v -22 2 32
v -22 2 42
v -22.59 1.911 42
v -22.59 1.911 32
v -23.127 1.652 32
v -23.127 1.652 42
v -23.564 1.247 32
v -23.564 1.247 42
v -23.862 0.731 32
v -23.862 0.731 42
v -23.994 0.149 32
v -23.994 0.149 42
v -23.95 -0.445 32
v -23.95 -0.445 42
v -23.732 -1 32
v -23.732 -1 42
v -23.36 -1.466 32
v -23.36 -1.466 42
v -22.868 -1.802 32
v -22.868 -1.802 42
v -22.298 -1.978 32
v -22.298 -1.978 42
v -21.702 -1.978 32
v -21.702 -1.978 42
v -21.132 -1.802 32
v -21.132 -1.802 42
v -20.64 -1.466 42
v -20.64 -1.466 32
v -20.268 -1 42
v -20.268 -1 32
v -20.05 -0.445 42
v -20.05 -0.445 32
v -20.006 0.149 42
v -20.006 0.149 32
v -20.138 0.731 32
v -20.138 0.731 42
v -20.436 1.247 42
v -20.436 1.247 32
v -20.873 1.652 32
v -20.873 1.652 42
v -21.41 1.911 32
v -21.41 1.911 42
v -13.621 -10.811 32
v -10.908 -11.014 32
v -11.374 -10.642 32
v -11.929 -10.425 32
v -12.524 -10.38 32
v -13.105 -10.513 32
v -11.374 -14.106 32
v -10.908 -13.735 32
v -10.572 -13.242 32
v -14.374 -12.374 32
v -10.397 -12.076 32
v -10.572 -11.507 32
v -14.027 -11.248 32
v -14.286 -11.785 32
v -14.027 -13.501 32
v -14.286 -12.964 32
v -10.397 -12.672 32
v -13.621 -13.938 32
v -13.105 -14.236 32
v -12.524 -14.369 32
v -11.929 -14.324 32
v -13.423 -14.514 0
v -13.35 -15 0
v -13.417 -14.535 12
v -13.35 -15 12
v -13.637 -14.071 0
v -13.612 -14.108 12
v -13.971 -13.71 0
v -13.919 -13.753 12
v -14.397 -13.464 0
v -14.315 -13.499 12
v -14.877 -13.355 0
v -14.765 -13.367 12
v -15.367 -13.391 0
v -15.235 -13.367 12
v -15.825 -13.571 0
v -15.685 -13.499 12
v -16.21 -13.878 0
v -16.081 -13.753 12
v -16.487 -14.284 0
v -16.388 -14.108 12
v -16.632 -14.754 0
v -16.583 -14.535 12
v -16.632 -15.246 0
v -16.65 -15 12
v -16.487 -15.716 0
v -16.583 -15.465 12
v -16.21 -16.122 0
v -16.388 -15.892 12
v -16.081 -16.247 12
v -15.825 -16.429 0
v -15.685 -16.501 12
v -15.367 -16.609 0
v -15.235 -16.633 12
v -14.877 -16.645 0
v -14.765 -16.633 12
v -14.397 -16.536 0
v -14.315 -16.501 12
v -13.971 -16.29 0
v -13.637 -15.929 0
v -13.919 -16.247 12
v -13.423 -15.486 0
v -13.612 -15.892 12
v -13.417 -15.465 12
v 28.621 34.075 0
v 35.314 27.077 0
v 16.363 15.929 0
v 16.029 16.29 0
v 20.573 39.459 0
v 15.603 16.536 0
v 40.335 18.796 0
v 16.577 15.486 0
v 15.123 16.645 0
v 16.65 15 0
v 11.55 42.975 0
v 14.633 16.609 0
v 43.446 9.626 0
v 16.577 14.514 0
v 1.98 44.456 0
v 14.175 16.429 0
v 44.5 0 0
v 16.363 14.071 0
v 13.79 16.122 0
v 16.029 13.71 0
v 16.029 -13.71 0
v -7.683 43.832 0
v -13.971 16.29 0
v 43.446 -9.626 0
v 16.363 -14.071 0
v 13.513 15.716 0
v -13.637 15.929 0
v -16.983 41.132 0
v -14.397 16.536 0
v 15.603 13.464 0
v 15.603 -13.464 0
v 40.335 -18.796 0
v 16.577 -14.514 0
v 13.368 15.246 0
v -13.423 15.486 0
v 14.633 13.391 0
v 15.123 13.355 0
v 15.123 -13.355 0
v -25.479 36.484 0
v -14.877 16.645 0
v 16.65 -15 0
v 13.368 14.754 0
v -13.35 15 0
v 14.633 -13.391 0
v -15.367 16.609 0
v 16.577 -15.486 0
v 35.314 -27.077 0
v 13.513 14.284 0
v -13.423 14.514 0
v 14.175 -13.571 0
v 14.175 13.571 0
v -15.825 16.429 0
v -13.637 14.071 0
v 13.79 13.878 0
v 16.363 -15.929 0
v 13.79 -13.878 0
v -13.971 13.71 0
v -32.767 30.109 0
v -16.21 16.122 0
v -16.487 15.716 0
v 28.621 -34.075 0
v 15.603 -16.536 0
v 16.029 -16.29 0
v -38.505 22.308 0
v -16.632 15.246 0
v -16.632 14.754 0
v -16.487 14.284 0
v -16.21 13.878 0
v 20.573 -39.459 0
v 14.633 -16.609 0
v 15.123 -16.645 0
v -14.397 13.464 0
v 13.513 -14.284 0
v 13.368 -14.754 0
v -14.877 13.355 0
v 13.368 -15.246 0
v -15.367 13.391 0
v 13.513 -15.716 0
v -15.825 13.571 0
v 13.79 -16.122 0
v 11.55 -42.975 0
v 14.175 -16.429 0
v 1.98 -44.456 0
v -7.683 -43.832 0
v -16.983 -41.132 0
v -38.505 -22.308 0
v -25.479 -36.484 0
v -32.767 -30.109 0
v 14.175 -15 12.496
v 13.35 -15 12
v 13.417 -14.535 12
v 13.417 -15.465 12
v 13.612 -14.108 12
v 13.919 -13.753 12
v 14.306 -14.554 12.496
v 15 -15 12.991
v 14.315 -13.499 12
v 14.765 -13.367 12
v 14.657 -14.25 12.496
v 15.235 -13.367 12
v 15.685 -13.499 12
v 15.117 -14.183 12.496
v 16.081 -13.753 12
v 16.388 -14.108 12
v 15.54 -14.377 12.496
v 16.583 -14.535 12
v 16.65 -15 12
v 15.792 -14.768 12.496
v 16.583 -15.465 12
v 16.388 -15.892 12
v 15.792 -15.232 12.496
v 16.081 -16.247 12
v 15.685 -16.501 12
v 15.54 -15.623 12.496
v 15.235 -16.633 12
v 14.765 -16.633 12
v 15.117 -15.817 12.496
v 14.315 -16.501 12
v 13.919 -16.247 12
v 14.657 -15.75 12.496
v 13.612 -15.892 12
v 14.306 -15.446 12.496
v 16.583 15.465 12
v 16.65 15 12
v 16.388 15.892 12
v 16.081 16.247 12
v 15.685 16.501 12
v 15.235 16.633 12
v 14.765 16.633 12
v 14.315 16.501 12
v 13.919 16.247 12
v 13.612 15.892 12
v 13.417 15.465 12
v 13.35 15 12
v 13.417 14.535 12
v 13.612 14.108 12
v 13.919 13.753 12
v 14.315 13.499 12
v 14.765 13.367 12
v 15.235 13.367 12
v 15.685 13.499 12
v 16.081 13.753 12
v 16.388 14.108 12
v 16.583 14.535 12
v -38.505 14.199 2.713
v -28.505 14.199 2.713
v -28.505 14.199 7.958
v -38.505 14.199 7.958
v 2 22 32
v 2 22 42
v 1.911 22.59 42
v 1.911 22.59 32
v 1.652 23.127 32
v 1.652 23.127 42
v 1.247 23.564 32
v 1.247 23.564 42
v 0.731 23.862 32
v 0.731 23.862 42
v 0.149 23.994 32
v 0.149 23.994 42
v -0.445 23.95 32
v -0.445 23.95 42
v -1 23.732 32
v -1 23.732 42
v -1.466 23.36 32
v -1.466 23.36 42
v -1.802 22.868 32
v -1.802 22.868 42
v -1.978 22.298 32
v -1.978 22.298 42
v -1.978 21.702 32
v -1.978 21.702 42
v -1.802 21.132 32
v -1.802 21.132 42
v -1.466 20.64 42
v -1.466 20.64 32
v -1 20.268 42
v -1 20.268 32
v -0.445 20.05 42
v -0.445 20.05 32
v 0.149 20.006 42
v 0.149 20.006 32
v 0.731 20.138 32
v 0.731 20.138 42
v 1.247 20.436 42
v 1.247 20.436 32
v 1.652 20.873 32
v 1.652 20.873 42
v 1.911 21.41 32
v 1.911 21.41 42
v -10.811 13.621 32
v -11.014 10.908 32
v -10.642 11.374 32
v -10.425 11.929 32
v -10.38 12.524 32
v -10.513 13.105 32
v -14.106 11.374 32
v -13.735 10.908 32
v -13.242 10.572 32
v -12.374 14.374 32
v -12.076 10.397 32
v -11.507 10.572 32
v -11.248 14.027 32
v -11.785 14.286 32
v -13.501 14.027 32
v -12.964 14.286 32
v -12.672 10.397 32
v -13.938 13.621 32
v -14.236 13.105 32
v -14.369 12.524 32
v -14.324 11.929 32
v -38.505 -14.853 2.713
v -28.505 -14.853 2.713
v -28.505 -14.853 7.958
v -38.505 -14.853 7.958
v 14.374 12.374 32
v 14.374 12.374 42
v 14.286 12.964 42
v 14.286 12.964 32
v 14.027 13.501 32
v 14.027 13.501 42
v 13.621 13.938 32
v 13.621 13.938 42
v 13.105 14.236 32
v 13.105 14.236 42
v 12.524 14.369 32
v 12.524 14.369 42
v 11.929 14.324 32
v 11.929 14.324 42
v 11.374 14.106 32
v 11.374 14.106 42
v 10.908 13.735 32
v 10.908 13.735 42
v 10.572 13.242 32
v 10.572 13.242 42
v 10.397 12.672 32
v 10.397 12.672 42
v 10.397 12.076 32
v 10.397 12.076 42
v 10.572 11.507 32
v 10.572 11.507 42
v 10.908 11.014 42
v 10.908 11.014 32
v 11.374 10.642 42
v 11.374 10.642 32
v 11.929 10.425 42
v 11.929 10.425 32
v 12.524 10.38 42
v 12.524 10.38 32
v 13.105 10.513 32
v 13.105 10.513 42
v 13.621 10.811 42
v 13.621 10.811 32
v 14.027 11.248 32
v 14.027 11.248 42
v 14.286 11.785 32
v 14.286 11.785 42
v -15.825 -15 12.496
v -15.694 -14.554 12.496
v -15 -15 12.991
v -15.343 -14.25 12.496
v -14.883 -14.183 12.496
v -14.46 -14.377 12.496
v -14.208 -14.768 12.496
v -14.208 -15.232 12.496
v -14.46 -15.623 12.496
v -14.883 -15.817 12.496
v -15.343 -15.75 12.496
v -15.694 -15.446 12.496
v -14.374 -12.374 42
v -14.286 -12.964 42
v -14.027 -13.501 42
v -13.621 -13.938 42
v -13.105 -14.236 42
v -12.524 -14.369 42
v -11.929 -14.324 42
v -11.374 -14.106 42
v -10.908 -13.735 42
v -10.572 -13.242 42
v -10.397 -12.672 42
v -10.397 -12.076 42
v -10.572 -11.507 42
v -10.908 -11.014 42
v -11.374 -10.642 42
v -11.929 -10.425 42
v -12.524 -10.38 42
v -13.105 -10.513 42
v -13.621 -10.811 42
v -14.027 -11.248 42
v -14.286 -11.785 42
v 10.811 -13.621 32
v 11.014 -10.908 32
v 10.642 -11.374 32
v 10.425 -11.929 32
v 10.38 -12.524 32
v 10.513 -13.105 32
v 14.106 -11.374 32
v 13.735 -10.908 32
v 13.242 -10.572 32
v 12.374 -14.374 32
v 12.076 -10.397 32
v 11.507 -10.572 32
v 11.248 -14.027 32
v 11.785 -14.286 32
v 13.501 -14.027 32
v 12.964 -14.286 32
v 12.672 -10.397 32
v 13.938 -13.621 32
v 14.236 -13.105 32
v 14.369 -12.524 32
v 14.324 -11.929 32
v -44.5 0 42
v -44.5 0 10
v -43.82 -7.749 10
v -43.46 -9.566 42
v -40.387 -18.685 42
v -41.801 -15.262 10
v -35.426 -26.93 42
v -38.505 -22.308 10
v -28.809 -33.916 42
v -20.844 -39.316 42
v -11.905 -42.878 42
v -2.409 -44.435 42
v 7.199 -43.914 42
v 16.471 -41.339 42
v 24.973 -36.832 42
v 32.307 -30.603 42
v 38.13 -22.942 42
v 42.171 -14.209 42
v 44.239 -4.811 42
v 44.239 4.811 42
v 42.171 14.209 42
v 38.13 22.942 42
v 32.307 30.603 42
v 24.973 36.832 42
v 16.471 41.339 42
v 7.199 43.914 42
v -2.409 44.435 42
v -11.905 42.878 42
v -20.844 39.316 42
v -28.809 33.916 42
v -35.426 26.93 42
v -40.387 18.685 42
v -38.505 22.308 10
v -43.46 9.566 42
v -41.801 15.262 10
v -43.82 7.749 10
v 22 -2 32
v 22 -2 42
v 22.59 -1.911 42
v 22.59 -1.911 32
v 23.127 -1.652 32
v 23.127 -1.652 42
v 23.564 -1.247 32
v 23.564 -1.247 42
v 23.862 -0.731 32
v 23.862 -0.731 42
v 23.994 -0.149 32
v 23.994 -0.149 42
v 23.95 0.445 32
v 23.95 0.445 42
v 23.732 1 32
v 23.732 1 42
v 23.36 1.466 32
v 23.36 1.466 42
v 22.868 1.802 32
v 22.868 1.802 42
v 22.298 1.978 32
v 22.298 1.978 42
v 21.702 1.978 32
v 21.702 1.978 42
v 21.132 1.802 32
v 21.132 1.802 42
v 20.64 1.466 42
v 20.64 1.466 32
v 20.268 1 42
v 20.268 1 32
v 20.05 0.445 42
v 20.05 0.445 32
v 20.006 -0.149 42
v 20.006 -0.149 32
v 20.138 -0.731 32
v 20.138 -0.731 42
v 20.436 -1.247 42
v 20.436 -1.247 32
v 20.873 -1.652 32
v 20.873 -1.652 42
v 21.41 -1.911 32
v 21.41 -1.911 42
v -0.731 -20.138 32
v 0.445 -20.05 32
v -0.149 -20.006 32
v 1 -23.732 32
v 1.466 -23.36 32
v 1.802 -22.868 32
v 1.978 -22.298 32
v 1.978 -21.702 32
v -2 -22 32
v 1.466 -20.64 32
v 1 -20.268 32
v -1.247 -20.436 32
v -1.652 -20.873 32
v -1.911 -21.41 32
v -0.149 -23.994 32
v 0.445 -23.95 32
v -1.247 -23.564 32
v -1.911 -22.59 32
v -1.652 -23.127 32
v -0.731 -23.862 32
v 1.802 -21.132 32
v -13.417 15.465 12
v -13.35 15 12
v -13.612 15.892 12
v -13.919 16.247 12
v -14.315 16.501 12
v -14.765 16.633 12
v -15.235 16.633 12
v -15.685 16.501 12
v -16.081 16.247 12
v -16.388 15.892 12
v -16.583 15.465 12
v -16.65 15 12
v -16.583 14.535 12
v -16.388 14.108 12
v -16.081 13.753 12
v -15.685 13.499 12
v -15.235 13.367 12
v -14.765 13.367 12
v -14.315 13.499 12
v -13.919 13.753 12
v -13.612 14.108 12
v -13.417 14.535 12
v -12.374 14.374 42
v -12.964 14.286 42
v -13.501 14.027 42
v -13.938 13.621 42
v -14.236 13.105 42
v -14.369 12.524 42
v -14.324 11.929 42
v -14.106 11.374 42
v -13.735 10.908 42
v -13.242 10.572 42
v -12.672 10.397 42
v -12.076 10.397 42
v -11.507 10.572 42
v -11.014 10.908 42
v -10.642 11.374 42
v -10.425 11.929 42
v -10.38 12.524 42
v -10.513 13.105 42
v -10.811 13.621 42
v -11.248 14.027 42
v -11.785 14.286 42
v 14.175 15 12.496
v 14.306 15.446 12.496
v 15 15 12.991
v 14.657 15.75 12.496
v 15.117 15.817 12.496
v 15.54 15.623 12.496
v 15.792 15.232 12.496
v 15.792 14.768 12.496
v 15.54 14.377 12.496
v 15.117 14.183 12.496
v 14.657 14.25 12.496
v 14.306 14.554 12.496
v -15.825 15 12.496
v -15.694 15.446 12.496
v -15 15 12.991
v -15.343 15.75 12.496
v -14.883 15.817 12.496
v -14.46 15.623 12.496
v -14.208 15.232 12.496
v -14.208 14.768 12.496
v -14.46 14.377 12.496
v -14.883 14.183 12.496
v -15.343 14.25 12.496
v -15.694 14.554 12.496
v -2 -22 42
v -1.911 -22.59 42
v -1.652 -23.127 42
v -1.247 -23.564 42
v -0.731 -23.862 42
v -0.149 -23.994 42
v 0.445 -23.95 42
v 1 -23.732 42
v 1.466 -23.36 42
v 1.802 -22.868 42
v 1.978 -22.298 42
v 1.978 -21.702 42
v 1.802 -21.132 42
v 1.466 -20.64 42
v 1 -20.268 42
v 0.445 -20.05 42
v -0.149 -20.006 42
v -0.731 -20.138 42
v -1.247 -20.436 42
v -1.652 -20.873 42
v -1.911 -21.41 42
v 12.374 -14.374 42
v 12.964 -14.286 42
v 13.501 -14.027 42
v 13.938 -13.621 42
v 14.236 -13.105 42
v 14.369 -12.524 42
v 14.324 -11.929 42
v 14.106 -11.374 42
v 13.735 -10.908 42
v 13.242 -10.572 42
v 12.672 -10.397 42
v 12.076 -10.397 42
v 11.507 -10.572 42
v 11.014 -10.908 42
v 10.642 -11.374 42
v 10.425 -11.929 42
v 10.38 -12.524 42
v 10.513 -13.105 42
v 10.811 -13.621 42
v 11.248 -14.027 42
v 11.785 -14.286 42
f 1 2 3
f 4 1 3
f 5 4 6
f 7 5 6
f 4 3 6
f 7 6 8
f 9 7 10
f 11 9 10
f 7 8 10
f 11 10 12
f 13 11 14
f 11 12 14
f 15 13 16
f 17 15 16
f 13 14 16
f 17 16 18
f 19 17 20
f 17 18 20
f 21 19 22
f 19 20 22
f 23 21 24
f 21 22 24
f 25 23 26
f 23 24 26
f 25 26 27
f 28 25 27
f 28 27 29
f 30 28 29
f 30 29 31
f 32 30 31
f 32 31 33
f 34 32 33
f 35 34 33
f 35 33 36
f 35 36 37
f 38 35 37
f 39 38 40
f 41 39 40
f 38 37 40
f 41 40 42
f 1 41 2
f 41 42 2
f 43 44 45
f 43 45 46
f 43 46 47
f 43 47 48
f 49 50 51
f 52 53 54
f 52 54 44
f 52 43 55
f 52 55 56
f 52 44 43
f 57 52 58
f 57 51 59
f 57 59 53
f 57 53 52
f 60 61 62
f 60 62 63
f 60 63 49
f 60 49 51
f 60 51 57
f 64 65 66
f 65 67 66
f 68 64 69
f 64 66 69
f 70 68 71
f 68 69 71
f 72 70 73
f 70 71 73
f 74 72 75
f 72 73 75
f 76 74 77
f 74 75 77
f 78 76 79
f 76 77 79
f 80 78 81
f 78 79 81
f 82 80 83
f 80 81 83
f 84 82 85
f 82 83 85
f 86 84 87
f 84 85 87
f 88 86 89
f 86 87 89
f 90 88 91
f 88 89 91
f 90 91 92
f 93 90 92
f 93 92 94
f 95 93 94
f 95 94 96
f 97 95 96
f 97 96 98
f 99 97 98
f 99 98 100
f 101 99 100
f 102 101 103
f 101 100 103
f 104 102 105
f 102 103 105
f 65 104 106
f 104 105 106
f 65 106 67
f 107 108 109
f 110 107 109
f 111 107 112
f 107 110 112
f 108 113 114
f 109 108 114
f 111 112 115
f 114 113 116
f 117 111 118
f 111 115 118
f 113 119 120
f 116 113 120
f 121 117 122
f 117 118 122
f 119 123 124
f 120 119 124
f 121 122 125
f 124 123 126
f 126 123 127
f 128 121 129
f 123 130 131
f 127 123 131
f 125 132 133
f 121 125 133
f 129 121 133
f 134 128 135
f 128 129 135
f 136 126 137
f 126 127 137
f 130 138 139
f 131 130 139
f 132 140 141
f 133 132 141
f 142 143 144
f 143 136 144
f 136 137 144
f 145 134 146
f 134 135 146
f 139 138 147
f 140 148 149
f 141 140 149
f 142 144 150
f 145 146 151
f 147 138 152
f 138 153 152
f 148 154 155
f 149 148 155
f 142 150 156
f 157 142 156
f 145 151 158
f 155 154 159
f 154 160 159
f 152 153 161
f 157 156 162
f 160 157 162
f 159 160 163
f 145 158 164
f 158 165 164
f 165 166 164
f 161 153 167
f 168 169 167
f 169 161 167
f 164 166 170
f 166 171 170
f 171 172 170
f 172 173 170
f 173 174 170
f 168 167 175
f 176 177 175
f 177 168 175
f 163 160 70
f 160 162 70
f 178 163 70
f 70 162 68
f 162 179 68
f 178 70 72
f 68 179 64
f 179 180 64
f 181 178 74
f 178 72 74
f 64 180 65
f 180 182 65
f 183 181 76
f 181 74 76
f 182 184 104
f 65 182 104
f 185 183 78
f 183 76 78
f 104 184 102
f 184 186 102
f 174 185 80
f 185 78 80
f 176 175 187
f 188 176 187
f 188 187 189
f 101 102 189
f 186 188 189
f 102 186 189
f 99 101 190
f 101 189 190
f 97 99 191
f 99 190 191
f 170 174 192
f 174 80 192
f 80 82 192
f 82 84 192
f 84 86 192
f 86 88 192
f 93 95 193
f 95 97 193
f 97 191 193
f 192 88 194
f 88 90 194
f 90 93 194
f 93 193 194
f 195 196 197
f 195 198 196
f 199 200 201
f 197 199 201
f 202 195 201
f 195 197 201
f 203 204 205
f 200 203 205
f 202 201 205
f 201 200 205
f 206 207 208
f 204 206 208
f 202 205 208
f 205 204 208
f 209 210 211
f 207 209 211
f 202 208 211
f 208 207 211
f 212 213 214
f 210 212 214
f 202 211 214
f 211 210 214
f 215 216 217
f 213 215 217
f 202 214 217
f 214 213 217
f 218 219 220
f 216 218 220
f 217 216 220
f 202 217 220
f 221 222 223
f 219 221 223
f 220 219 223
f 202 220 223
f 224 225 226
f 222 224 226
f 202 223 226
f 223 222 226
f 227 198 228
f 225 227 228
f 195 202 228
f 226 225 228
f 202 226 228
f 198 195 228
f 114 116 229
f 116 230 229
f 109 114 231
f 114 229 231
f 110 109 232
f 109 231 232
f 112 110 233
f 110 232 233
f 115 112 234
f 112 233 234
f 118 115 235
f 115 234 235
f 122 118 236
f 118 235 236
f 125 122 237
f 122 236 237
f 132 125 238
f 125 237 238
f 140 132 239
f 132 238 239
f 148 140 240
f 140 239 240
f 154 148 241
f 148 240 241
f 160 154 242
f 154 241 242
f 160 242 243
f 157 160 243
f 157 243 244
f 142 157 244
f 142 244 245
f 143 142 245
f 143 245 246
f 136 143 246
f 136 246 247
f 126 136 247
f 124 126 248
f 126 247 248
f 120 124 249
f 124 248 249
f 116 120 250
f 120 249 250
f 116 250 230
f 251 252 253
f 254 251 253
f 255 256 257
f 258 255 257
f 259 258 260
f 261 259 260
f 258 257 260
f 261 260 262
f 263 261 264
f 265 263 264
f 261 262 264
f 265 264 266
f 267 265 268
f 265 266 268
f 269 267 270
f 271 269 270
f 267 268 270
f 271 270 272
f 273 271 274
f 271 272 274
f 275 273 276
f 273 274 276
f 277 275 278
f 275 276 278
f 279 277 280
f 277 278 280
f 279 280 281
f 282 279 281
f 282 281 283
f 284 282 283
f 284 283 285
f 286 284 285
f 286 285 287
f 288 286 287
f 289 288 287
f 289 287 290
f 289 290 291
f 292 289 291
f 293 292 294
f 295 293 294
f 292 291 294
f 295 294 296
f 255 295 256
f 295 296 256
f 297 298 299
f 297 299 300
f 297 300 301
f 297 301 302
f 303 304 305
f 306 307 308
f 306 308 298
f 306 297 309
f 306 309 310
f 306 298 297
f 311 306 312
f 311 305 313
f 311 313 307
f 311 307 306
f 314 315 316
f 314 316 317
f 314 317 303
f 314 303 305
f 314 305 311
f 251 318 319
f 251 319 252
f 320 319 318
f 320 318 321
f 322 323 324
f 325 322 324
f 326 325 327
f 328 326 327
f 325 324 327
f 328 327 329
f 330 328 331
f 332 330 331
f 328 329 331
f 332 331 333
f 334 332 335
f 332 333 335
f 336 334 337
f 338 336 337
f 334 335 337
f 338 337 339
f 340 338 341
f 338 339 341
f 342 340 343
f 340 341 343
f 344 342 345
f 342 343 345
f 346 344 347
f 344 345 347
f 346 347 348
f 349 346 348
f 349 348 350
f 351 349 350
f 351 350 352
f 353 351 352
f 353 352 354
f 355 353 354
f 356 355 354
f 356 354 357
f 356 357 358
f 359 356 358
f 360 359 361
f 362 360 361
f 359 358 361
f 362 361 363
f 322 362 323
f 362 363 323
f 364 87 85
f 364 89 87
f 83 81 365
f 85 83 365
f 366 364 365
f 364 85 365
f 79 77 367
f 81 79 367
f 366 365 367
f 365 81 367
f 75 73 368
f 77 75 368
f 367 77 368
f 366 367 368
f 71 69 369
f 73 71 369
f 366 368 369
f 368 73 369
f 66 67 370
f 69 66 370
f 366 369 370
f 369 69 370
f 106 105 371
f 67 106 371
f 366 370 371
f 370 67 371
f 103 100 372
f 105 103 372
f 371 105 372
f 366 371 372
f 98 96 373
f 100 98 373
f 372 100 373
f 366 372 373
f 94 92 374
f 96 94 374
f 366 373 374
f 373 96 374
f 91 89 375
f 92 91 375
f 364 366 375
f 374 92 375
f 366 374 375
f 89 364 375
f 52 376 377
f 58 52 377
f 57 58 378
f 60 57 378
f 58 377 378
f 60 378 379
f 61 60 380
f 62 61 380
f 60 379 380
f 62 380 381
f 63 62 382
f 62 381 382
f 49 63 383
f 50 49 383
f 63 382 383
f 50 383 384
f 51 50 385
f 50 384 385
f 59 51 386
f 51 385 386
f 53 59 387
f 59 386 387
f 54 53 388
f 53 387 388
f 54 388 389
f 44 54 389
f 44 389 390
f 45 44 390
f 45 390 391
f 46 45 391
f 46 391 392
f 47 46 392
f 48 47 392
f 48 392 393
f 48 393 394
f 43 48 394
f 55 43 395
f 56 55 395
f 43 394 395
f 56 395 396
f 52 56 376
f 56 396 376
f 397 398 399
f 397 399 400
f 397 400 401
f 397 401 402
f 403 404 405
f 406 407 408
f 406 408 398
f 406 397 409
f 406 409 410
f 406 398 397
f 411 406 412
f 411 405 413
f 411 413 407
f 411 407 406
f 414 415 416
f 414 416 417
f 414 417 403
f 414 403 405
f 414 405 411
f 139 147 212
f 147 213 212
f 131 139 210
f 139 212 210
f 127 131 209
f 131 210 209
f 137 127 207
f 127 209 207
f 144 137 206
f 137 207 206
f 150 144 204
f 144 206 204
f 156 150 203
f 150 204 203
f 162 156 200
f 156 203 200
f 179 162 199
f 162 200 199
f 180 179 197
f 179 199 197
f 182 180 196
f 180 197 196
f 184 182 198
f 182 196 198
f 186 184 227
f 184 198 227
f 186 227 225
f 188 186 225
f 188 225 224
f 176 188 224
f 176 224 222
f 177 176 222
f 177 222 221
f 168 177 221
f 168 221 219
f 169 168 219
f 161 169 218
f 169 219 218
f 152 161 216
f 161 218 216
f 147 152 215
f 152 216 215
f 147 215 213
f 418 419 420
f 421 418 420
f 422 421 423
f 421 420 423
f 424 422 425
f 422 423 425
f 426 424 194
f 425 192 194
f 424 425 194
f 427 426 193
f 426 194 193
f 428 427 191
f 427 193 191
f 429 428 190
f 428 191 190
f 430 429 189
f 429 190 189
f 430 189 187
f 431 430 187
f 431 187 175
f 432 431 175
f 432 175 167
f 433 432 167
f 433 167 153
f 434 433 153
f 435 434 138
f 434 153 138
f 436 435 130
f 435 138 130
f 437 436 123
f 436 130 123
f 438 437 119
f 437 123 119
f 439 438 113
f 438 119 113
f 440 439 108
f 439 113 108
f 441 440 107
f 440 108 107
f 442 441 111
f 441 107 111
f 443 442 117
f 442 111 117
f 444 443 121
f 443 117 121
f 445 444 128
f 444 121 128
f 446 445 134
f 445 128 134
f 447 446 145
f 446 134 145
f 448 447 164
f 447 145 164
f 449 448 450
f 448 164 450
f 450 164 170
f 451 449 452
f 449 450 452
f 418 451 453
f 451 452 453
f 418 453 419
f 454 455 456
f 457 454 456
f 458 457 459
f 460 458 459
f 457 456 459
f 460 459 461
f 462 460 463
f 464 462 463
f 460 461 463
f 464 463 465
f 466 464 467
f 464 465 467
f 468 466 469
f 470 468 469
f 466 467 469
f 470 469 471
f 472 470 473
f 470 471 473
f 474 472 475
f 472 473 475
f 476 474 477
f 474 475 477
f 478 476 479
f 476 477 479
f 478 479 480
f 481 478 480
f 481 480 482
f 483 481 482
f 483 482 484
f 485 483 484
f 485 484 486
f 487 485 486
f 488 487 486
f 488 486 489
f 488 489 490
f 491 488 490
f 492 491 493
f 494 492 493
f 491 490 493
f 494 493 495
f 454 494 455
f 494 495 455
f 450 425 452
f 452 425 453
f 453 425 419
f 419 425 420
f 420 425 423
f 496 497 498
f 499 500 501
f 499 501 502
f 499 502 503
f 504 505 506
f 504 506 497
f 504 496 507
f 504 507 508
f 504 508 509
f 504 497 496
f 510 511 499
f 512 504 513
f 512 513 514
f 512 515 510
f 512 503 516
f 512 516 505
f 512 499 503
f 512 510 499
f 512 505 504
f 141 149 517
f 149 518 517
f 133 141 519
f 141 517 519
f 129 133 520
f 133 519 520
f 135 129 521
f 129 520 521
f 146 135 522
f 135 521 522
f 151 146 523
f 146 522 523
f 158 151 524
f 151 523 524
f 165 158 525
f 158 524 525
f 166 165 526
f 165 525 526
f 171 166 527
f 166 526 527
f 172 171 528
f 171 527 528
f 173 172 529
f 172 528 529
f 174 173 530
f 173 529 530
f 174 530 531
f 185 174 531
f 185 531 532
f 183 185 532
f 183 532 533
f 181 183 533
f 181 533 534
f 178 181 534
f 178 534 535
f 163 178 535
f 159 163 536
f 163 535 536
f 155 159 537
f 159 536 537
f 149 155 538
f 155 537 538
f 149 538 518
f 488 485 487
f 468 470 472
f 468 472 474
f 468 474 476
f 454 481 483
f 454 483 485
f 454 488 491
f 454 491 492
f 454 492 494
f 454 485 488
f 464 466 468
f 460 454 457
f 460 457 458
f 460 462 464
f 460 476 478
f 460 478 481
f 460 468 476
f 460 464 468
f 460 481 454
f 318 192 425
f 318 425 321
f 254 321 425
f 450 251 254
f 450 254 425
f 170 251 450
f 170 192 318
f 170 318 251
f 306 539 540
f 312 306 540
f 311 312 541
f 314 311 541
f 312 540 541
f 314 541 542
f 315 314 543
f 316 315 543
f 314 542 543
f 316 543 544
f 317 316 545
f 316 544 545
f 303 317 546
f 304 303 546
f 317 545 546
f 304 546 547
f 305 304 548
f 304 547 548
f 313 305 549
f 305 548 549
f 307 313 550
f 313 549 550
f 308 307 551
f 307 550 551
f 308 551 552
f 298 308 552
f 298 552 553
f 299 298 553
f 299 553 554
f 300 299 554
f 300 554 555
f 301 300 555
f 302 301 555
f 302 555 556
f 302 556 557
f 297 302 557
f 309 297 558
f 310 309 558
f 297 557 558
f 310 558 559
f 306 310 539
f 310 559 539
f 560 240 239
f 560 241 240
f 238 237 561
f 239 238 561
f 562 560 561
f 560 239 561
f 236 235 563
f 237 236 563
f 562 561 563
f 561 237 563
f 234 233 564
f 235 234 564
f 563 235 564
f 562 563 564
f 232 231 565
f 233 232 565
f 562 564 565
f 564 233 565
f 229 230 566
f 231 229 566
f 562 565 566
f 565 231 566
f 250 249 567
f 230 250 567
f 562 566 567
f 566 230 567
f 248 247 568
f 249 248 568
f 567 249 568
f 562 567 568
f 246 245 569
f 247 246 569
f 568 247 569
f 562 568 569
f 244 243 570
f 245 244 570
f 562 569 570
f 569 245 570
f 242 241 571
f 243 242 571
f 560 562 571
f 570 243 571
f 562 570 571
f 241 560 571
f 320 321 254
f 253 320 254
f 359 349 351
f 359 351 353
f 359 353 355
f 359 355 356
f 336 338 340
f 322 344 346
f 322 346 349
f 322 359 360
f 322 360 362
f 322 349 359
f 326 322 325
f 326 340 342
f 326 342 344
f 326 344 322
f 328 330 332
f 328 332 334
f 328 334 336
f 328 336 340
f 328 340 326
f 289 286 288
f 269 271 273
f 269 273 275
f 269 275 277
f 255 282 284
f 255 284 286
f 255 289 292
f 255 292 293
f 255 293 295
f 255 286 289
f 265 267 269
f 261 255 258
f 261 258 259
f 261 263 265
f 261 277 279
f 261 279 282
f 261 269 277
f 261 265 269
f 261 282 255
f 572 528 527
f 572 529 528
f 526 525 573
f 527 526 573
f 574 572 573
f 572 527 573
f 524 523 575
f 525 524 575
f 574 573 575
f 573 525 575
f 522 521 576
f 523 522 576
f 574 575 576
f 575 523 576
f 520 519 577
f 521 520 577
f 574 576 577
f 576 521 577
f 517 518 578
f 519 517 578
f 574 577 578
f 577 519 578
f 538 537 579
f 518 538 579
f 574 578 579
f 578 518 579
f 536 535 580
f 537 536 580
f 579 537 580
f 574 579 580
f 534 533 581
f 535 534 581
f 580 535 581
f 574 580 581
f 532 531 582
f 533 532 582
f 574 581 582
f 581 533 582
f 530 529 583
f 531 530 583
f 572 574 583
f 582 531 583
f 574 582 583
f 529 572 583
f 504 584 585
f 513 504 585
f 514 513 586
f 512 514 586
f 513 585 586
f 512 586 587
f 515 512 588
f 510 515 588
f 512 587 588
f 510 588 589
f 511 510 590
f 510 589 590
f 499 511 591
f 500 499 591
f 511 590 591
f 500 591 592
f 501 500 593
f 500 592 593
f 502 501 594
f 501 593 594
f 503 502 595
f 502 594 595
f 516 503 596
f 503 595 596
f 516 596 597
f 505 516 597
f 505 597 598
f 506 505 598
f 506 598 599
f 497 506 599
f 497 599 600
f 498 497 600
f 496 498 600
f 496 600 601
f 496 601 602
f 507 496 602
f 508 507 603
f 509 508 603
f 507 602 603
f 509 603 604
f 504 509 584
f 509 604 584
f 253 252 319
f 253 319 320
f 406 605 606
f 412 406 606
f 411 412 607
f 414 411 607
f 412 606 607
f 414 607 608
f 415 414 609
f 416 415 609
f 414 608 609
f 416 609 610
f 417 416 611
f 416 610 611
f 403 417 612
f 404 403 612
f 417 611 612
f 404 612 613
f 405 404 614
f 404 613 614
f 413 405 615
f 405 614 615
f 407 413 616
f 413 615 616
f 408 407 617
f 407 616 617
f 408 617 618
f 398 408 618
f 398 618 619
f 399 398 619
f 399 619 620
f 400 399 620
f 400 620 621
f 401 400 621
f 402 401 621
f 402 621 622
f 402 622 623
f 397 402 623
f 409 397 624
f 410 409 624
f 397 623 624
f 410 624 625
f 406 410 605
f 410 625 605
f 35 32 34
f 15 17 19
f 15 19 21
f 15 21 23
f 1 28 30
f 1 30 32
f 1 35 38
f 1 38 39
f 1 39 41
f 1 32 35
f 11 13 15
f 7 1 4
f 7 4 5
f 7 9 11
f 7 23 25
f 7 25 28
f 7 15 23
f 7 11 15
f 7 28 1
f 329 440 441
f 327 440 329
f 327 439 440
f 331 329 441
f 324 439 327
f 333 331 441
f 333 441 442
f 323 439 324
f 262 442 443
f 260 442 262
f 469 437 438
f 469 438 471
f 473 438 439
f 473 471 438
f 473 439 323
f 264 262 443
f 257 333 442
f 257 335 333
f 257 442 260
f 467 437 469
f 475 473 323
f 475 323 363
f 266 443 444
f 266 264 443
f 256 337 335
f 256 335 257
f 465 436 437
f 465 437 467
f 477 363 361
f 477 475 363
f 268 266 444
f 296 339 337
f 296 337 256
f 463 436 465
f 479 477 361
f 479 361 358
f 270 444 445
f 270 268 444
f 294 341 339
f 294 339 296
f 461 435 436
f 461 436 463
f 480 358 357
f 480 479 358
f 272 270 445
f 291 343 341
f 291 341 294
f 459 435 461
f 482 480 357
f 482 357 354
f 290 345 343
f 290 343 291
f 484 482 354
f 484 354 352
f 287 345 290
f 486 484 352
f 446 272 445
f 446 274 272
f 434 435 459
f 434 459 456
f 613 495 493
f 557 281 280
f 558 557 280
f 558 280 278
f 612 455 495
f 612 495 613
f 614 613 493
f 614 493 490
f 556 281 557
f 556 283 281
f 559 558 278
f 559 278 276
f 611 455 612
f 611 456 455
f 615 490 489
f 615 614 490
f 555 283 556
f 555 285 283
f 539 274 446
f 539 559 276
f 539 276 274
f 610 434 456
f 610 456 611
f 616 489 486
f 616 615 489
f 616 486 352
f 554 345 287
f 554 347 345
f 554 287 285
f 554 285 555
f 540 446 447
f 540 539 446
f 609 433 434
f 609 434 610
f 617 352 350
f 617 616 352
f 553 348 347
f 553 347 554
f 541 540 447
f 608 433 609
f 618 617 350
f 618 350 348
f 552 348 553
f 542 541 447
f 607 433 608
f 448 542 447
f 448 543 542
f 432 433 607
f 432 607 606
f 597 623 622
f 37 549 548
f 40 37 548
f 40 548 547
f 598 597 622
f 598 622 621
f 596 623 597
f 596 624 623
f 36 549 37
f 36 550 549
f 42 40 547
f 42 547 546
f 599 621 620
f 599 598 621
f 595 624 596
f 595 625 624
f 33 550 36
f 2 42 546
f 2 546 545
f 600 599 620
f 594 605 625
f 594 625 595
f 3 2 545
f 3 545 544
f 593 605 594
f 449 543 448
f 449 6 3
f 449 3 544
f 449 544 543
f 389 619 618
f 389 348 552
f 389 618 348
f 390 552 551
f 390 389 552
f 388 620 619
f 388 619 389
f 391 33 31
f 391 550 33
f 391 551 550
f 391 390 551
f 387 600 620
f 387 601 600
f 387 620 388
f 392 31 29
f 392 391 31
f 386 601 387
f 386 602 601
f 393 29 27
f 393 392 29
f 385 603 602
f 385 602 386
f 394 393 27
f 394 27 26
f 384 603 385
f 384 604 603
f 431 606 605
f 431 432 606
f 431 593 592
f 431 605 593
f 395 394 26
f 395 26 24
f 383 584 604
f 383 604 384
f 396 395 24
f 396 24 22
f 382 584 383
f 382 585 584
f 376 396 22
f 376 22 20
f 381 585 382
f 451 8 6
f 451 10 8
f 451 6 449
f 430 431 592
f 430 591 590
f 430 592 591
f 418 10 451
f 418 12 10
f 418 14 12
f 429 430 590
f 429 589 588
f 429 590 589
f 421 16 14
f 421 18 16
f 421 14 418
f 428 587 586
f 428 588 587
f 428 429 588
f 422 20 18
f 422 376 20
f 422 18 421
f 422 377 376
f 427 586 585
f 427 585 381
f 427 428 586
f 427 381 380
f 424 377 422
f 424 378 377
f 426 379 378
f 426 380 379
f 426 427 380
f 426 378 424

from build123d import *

# Parameters (mm, degrees)
SKETCH_1_R               = 44.5
EXTRUDE_1_DEPTH          = 42
HOLE_WIZARD_M4_1_D       = 3.3
HOLE_WIZARD_M4_1_DEPTH   = 12
HOLE_WIZARD_M4_1_TIP     = 0.991420021
SKETCH_4_R               = 2
CUT_EXTRUDE_1_DEPTH      = 10
PATTERN_CIRCULAR_1_COUNT = 4
SKETCH_5_W               = 19.478252765
SKETCH_5_H               = 48.547320344
CUT_EXTRUDE_2_DEPTH      = 10
SKETCH_6_W               = 5.245291094
SKETCH_6_H               = 29.052548629
CUT_EXTRUDE_3_DEPTH      = 10


with BuildPart() as part:
    # 草图1 → 凸台-拉伸1 (new body)
    with BuildSketch(Plane.XY):
        with Locations(Location((0, 0, 0), (0, 0, 180))):
            Circle(SKETCH_1_R)
    extrude(amount=EXTRUDE_1_DEPTH)

    # M4 螺纹孔的螺纹孔钻头1
    with Locations(Plane(origin=(15, 15, 0), x_dir=(-1, 0, 0), z_dir=(0, 0, -1))):
        with Locations((0, 0), (30, 0), (30, -30), (0, -30)):
            Hole(HOLE_WIZARD_M4_1_D / 2, depth=HOLE_WIZARD_M4_1_DEPTH)
            with Locations((0, 0, -(HOLE_WIZARD_M4_1_DEPTH + HOLE_WIZARD_M4_1_TIP / 2))):  # 118° drill point
                Cone(0, HOLE_WIZARD_M4_1_D / 2, HOLE_WIZARD_M4_1_TIP, mode=Mode.SUBTRACT)

    # 草图4 → 切除-拉伸1 (cut)
    with BuildSketch(Plane.XY.offset(42)):
        with Locations((0, 22)):
            Circle(SKETCH_4_R)
        with Locations((12.374368671, 12.374368671)):
            Circle(SKETCH_4_R)
    cut_extrude_1 = extrude(amount=-CUT_EXTRUDE_1_DEPTH, mode=Mode.SUBTRACT)

    # 阵列(圆周)1: 切除-拉伸1 ×4 about axis
    pattern_circular_1_axis = Axis((0, 0, 0), (0, 0, 1))
    for i in range(1, PATTERN_CIRCULAR_1_COUNT):
        add(cut_extrude_1.rotate(pattern_circular_1_axis, i * 360 / PATTERN_CIRCULAR_1_COUNT), mode=Mode.SUBTRACT)

    # 草图5 → 切除-拉伸2 (cut)
    with BuildSketch(Plane(origin=(0, 0, 0), x_dir=(-1, 0, 0), z_dir=(0, 0, -1))):
        with Locations((48.243799035, -1.742903496)):
            Rectangle(SKETCH_5_W, SKETCH_5_H)
    extrude(amount=-CUT_EXTRUDE_2_DEPTH, mode=Mode.SUBTRACT)

    # 草图6 → 切除-拉伸3 (cut)
    with BuildSketch(Plane.ZY.offset(38.504672652)):
        with Locations((5.335468617, -0.326949721)):
            Rectangle(SKETCH_6_W, SKETCH_6_H)
    extrude(amount=-CUT_EXTRUDE_3_DEPTH, mode=Mode.SUBTRACT)


solid = part.part
